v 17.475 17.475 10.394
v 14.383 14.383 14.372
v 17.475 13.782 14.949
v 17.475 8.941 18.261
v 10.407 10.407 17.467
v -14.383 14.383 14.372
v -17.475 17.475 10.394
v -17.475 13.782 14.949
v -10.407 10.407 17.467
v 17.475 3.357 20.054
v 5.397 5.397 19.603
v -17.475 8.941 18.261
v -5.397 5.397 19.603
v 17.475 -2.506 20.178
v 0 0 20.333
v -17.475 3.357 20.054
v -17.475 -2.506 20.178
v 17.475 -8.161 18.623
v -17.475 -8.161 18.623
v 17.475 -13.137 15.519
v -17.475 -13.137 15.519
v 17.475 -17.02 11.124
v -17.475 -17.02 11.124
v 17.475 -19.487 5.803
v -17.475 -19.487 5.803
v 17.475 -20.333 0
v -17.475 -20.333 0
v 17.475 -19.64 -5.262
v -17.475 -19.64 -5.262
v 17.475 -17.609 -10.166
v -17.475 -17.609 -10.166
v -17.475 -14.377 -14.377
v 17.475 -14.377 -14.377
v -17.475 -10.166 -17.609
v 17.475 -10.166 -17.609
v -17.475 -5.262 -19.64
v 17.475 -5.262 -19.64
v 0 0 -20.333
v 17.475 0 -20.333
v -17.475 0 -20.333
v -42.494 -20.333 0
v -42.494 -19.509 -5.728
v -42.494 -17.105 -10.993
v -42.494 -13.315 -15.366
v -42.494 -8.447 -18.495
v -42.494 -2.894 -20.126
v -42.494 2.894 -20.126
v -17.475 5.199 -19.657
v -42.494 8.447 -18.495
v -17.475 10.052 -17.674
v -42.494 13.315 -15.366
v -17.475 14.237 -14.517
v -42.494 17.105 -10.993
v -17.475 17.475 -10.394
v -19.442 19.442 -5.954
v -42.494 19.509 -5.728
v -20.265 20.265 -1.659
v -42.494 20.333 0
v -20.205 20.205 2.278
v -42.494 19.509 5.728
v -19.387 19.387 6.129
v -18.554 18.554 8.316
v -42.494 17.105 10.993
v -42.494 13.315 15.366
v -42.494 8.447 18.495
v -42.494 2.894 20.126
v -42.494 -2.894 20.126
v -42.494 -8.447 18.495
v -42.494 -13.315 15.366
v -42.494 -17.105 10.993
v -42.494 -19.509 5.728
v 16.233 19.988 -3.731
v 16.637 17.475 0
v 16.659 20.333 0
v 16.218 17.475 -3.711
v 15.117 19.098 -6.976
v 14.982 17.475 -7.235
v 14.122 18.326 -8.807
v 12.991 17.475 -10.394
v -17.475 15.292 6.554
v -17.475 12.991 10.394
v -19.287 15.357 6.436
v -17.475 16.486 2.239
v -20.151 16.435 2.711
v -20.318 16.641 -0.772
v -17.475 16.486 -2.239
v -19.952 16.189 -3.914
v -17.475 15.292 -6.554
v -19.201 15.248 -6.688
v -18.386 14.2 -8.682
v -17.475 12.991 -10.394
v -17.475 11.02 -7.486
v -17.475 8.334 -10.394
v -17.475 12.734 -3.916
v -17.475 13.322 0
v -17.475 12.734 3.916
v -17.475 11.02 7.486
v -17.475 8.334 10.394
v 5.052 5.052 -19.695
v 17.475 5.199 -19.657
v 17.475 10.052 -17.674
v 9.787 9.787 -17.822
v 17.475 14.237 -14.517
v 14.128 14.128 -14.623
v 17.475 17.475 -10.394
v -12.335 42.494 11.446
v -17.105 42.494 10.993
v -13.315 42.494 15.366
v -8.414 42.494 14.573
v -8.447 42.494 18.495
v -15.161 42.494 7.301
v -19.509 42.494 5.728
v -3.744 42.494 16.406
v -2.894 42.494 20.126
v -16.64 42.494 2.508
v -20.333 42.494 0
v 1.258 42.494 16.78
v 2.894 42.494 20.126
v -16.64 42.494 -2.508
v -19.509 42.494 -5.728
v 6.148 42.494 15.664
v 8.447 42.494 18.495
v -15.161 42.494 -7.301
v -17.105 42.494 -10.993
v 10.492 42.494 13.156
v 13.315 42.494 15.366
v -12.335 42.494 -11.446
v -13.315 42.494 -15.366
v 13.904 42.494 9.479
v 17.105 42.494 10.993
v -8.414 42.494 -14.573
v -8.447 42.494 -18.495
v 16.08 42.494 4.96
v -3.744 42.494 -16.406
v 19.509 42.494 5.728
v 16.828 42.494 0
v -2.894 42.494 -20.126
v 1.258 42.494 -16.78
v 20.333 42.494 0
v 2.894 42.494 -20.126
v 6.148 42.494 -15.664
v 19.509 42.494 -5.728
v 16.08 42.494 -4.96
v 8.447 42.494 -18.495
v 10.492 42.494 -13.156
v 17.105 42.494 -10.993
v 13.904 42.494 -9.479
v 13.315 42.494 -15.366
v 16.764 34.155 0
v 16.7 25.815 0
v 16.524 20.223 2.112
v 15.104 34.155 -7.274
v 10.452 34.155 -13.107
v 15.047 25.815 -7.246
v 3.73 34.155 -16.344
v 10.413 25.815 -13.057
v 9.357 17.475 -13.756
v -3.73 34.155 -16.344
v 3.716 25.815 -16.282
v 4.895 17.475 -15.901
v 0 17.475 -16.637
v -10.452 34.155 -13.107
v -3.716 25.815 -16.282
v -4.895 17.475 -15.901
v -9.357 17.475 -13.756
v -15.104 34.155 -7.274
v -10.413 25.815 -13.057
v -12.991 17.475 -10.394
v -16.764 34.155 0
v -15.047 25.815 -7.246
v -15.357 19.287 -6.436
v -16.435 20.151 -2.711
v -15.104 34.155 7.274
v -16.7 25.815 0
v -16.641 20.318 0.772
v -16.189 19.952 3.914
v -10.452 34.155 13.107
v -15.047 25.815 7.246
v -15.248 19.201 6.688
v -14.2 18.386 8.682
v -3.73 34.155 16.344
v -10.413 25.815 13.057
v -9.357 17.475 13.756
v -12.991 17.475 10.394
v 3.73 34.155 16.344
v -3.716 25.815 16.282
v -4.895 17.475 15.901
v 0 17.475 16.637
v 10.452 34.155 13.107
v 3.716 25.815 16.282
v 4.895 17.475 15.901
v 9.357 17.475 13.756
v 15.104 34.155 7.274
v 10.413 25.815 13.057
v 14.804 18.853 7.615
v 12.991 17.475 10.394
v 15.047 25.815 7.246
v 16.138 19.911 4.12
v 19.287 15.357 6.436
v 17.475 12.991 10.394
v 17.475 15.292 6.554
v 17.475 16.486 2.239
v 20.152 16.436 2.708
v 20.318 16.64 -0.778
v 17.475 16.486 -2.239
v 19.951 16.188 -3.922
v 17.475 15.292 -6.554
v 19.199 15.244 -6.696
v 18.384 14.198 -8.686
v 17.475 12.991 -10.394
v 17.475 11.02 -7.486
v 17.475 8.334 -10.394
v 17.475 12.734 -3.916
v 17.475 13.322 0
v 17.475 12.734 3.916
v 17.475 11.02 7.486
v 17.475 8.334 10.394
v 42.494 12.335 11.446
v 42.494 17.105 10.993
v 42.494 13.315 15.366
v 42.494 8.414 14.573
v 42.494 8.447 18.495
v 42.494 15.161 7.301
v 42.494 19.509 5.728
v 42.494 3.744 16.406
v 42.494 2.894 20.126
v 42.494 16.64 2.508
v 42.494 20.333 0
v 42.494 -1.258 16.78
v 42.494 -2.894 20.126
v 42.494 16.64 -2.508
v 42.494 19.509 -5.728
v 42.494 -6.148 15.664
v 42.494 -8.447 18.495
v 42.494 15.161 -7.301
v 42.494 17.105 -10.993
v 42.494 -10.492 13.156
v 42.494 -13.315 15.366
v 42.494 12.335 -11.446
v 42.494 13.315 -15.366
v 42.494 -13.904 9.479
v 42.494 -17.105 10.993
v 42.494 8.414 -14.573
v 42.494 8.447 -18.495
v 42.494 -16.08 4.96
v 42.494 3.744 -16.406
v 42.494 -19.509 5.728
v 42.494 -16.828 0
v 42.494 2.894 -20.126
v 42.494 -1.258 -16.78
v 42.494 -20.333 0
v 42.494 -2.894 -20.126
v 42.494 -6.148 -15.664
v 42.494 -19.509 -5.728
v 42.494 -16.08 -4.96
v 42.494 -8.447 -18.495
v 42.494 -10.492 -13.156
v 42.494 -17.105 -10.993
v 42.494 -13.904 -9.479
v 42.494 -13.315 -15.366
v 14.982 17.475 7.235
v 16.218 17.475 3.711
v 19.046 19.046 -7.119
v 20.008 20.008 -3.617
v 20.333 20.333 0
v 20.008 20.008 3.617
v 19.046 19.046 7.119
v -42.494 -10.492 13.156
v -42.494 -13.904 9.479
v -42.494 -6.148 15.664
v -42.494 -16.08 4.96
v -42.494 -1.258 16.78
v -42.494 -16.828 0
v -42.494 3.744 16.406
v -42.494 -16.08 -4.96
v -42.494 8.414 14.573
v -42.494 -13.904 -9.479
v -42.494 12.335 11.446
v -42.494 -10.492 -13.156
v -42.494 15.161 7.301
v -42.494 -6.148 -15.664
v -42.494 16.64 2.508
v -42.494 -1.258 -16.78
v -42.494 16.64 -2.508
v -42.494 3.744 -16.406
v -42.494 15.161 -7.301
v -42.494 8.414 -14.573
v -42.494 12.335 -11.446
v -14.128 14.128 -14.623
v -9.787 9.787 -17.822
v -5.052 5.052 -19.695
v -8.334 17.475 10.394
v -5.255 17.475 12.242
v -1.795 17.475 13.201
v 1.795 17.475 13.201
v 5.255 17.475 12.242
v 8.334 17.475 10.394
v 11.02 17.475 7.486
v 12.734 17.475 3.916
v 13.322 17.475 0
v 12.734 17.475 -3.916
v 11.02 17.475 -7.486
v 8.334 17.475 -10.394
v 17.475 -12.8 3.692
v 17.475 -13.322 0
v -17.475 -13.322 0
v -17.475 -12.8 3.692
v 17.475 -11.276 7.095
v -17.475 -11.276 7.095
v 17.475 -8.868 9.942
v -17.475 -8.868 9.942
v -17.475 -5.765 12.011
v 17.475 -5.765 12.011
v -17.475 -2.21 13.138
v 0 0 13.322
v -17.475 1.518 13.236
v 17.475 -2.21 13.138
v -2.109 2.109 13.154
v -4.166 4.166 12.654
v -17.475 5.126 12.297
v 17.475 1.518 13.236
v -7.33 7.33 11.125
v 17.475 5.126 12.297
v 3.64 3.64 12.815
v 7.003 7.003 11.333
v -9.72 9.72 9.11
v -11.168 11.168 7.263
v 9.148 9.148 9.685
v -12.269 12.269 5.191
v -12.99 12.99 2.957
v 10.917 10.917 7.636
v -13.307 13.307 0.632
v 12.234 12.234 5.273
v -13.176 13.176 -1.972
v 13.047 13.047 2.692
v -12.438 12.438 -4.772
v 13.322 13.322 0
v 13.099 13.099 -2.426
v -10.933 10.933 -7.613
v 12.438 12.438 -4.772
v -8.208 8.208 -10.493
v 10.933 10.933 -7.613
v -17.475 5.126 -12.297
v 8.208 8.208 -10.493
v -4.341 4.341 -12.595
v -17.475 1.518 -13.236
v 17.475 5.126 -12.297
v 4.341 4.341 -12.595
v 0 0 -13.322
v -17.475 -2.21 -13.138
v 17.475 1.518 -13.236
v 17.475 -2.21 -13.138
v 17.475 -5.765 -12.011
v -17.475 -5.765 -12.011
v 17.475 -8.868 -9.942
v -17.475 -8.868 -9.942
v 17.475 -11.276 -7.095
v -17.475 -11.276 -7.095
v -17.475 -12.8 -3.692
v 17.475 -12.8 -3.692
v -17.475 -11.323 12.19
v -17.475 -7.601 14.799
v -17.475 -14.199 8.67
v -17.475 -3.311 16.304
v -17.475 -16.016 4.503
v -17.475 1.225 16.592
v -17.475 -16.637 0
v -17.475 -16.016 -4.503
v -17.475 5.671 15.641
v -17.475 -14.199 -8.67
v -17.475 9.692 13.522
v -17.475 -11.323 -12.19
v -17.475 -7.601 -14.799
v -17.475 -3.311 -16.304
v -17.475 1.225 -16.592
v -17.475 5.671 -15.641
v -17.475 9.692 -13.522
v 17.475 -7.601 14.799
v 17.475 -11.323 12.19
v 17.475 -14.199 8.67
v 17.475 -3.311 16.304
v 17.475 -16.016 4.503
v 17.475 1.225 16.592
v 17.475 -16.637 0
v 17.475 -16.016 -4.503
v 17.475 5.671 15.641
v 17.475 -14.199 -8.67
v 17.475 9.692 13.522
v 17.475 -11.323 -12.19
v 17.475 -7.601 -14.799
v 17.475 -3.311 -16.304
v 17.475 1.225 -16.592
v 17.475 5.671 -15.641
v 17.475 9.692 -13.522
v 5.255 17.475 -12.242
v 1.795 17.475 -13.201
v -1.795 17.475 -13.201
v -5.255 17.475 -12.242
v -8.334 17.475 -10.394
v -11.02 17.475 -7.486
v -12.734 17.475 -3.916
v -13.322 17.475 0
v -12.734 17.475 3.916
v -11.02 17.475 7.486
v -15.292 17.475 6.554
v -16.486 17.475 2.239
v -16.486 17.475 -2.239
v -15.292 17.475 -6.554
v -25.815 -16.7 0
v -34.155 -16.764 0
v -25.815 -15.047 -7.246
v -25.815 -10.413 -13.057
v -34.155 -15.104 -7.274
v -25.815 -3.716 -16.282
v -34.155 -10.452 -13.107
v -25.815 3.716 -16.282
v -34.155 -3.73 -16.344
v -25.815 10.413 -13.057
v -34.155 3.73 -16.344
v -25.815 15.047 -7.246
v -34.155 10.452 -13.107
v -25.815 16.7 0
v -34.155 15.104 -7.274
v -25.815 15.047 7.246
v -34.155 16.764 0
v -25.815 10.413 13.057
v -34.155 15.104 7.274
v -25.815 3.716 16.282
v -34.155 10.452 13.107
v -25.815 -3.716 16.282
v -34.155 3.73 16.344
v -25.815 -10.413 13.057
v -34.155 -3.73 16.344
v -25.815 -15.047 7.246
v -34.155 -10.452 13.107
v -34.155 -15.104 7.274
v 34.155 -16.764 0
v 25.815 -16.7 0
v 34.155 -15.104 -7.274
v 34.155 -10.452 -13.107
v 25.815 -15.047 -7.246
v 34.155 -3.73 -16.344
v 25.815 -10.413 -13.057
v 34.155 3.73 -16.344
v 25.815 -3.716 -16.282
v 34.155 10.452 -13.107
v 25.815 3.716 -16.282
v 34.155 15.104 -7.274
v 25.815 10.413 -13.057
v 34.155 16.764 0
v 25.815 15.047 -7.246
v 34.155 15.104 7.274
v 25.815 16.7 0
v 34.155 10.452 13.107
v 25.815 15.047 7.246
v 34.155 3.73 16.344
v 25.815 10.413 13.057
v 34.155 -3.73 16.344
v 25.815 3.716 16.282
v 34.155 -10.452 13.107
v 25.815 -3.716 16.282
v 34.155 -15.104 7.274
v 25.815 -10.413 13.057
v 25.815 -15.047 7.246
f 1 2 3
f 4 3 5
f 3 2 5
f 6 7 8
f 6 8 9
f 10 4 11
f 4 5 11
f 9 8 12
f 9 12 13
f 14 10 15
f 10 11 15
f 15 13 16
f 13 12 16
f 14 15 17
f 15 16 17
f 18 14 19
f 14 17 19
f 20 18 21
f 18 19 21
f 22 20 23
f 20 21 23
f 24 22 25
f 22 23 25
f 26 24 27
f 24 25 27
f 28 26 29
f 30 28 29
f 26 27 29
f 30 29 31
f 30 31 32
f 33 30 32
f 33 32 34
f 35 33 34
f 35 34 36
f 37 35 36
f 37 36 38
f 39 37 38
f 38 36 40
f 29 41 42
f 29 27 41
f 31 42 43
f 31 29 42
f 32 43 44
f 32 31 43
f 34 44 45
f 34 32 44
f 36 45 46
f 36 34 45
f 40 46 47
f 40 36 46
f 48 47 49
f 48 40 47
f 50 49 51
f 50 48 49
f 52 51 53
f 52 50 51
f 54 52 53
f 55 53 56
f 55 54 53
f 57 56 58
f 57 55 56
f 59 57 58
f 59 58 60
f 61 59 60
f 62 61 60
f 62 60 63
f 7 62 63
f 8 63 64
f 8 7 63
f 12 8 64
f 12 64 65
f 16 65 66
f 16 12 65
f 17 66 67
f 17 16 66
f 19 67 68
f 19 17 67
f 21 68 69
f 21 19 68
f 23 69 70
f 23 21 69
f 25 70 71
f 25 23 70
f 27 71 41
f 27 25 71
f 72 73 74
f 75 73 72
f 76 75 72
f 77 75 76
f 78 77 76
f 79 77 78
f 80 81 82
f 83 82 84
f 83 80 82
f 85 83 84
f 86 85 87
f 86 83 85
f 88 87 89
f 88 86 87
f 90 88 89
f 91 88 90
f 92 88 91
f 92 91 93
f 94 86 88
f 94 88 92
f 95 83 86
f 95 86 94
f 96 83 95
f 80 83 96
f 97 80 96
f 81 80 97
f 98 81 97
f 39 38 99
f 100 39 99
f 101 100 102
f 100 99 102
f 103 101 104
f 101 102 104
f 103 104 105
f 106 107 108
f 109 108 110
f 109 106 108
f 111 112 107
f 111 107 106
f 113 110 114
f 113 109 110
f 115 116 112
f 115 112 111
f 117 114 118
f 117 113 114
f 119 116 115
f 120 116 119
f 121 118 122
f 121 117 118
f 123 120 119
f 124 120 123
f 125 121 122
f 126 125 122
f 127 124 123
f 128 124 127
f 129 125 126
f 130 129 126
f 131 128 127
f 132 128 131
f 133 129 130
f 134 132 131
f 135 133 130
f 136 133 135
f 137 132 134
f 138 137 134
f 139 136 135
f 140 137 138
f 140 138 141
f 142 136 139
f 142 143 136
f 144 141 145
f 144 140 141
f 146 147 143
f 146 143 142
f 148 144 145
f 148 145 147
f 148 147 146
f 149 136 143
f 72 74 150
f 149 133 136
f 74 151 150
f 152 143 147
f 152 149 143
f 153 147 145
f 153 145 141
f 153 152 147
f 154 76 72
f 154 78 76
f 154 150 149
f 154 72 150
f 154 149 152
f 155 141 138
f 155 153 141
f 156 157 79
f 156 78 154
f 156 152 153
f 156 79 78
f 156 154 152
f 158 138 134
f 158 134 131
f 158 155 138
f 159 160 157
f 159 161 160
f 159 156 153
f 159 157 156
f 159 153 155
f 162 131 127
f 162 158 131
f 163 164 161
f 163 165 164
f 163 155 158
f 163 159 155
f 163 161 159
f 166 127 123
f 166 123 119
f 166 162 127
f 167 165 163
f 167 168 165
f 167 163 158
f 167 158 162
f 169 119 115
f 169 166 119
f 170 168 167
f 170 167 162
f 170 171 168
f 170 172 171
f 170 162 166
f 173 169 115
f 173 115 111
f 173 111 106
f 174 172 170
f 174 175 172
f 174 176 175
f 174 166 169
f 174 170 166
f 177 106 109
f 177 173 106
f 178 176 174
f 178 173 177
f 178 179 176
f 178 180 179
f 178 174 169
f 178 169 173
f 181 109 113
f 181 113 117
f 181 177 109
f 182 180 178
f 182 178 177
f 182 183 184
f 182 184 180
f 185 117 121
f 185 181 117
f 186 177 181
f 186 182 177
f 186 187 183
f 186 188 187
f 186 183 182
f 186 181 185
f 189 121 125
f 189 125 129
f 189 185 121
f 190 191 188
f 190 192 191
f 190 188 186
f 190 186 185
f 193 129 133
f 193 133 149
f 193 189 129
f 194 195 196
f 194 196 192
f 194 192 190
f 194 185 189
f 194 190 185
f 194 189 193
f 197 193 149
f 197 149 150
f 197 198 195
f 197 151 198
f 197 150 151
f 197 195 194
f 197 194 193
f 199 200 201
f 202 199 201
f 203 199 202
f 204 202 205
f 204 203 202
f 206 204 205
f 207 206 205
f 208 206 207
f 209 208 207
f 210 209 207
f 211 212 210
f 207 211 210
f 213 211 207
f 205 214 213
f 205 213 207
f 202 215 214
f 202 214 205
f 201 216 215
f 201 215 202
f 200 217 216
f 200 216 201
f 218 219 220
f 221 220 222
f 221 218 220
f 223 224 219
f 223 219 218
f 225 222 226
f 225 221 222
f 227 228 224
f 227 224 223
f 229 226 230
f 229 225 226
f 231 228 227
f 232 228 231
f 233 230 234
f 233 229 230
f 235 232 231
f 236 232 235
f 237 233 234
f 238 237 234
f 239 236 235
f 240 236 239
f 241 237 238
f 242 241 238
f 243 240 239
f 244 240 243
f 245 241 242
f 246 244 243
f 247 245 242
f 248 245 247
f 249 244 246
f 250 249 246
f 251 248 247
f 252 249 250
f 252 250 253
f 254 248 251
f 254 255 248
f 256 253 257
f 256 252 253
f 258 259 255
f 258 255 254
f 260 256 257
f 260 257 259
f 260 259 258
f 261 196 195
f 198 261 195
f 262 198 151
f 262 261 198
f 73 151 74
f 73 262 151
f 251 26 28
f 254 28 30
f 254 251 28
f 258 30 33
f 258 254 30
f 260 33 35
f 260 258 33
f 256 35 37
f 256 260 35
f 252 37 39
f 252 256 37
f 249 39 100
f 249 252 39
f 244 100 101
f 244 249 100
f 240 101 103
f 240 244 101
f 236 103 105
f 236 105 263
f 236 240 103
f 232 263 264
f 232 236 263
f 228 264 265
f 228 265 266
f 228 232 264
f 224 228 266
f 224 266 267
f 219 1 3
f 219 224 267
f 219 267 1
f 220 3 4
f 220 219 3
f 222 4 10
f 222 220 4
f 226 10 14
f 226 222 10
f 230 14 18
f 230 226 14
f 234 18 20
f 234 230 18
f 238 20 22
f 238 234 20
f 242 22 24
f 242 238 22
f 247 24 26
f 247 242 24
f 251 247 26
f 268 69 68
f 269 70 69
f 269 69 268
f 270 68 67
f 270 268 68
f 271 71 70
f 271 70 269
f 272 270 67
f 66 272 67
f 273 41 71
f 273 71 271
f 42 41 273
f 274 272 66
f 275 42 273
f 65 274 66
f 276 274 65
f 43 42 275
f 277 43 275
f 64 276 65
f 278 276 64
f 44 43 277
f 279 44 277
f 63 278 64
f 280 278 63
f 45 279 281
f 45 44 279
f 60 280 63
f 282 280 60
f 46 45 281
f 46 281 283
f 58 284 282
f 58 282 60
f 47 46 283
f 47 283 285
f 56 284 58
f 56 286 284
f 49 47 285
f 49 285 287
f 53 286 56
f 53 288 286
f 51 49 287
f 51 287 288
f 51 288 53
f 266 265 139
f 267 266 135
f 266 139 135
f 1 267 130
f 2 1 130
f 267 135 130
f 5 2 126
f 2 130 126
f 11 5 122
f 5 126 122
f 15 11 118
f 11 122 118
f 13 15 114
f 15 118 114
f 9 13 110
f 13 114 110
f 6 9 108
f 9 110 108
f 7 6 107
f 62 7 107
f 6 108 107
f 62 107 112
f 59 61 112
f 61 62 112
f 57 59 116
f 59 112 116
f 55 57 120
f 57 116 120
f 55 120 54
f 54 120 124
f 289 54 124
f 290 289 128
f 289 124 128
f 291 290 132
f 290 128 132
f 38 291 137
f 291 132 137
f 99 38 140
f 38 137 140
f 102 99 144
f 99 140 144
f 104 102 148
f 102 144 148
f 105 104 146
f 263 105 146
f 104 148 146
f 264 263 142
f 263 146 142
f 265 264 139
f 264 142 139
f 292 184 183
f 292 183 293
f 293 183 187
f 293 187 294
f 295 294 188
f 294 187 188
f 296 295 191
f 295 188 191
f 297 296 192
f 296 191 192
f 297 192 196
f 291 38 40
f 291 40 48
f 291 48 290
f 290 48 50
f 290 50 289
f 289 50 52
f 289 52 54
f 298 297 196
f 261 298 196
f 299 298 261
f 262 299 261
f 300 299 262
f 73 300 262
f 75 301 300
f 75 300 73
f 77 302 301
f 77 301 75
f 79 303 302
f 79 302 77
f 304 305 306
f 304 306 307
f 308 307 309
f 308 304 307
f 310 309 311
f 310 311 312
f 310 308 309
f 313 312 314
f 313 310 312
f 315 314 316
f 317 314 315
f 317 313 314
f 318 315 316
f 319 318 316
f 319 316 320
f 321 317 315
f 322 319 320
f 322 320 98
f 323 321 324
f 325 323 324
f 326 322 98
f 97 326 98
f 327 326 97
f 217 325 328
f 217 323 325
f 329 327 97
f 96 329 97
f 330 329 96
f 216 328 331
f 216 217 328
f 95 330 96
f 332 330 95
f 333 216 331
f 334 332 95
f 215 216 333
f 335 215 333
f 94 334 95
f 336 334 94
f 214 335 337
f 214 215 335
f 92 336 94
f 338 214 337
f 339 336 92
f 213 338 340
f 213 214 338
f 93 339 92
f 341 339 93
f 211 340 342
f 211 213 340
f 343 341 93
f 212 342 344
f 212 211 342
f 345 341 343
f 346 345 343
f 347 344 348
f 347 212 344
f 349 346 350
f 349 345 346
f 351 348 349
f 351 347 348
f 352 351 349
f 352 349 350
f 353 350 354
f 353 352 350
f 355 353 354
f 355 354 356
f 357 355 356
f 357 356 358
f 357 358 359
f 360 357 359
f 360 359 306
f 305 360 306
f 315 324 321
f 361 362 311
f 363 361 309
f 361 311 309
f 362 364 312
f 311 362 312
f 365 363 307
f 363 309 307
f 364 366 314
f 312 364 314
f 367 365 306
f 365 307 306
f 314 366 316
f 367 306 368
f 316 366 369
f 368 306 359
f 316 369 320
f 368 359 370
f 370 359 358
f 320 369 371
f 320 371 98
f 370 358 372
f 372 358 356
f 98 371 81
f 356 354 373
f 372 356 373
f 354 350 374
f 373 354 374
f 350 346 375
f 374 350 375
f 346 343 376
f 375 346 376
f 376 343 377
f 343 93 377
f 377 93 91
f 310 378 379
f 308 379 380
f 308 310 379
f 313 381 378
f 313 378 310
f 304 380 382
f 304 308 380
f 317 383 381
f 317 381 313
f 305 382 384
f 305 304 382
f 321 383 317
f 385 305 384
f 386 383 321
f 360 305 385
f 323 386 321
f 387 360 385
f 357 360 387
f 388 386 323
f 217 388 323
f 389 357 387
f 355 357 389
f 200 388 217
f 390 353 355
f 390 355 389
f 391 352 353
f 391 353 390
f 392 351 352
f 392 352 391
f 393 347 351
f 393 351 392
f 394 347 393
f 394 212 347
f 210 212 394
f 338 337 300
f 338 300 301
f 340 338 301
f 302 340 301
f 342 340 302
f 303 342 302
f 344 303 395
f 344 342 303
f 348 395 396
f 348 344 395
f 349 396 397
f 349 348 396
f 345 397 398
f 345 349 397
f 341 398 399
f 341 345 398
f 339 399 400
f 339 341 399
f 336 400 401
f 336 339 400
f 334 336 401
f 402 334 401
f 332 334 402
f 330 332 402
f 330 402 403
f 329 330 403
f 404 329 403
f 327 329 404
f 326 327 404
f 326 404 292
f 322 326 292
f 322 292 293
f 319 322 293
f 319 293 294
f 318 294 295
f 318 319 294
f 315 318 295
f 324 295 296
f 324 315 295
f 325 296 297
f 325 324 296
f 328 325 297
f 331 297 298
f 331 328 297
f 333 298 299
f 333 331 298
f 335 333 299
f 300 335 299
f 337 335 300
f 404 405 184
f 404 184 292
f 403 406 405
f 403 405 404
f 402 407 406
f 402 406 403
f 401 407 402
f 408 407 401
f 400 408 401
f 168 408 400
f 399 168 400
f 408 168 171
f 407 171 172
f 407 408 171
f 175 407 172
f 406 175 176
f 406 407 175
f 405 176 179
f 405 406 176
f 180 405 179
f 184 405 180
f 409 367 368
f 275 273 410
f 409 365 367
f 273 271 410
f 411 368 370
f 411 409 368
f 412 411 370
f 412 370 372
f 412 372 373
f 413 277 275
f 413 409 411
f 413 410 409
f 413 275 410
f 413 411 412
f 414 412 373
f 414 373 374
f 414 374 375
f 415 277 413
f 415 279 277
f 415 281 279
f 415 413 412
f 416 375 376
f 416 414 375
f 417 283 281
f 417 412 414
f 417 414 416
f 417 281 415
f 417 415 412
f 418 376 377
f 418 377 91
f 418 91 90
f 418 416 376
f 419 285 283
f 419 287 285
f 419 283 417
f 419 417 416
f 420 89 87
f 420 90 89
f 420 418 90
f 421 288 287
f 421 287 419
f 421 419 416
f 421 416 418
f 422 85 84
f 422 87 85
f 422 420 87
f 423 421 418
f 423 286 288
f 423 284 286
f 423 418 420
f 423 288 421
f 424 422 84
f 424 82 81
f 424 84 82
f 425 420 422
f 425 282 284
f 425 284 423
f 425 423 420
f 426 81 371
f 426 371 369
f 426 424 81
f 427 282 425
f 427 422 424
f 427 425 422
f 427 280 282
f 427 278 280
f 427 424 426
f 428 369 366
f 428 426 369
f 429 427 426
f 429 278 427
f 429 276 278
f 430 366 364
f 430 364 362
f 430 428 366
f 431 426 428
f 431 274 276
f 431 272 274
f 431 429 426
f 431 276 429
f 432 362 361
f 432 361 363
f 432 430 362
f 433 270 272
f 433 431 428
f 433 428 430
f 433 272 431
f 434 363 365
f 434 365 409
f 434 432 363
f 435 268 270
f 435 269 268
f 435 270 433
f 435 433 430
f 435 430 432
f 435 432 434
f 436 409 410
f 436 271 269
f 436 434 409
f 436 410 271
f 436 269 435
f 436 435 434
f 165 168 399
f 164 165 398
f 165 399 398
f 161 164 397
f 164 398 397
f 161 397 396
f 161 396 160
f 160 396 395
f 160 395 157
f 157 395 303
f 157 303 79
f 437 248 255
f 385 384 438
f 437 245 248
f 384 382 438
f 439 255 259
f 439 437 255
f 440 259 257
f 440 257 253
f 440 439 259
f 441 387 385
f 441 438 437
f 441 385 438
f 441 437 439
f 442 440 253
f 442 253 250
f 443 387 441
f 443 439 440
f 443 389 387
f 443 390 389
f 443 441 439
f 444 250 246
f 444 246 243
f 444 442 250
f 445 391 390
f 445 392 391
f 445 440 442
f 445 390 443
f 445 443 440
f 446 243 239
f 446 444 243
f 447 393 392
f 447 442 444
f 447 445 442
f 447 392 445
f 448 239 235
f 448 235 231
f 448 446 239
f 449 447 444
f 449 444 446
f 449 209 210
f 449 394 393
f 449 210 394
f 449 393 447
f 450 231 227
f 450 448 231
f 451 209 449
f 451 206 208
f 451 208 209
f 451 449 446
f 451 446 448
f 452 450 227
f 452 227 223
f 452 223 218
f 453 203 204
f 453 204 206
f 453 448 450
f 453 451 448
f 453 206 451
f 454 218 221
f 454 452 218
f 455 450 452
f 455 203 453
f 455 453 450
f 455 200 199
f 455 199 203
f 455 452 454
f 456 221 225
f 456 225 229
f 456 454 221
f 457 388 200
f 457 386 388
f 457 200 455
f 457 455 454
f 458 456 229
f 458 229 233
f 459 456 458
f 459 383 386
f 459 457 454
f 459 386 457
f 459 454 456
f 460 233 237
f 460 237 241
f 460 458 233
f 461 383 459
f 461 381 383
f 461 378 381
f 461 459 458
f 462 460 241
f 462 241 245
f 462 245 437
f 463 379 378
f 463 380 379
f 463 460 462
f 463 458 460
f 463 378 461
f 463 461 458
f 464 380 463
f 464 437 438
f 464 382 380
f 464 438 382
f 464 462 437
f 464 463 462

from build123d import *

# Parameters (mm, degrees)
SKETCH4_R           = 20.3327
BOSS_EXTRUDE1_DEPTH = 34.9504
SKETCH5_R           = 20.3327
BOSS_EXTRUDE2_DEPTH = 17.4752


with BuildPart() as part:
    # Sketch1 → Revolve1 (revolve)
    with BuildSketch(Plane.XY):
        Polygon((-42.4942, -20.3327), (-17.4752, -20.3327), (-17.4752, -16.637), (-42.4942, -16.8275), align=None)
        Polygon((42.4942, -16.8275), (17.4752, -16.637), (17.4752, -20.3327), (42.4942, -20.3327), align=None)
    revolve(axis=Axis((-42.4942, 0, 0), (1, 0, 0)))



with BuildPart() as body_2:
    # Sketch2 → Revolve2 (revolve)
    with BuildSketch(Plane.XY):
        Polygon((16.8275, 42.4942), (16.637, 17.4752), (20.3327, 17.4752), (20.3327, 42.4942), align=None)
    revolve(axis=Axis((0, 0, 0), (0, 1, 0)))


with BuildPart() as part_1:
    add(part.part)

    add(body_2.part)  # Boss-Extrude1 merges body 2
    # Sketch4 → Boss-Extrude1 (add)
    with BuildSketch(Plane(origin=(-17.4752, 0, 0), x_dir=(0, 0, -1), z_dir=(1, 0, 0))):
        Circle(SKETCH4_R)
    extrude(amount=BOSS_EXTRUDE1_DEPTH)

    # Sketch5 → Boss-Extrude2 (add)
    with BuildSketch(Plane.XZ.offset(-17.4752)):
        Circle(SKETCH5_R)
    extrude(amount=BOSS_EXTRUDE2_DEPTH)

    # Sketch6 → Cut-Revolve1 (revolve, cut)
    with BuildSketch(Plane.XY):
        Polygon((-42.4942, -16.8275), (-17.4752, -16.637), (-17.4752, -13.3223), (17.4752, -13.3223), (17.4752, -16.637), (42.4942, -16.8275), (42.4942, 0), (-42.4942, 0), align=None)
    revolve(axis=Axis((42.4942, 0, 0), (-1, 0, 0)), mode=Mode.SUBTRACT)

    # Sketch7 → Cut-Revolve2 (revolve, cut)
    with BuildSketch(Plane.XY):
        Polygon((16.8275, 42.4942), (16.637, 17.4752), (13.3223, 17.4752), (13.3223, 0), (0, 0), (0, 42.4942), align=None)
    revolve(axis=Axis((0, 0, 0), (0, 1, 0)), mode=Mode.SUBTRACT)


solid = part_1.part
